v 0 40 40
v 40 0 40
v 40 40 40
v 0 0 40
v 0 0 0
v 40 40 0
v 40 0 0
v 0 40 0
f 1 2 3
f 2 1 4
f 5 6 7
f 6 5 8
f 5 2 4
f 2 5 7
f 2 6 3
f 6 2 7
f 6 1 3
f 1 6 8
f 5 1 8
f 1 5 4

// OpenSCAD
// Simple parametric cube generator for OpenSCAD
// Tweak the parameters below. Supports optional chamfer or fillet.

/****************************
 * User parameters
 ****************************/
size_x = 40;
size_y = 40;
size_z = 40;
center_cube = false;     // center at origin if true

// Edge treatment: choose one of none | chamfer | fillet
edge_style = "none";     // "none", "chamfer", or "fillet"
edge_amount = 3;          // chamfer size or fillet radius
$fn = 48;

/****************************
 * Helpers
 ****************************/
module base_cube(sz=[40,40,40], center=false) {
    cube(sz, center=center);
}

module chamfered_cube(sz=[40,40,40], c=2, center=false) {
    // Chamfer edges by subtracting triangular prisms at each edge
    difference() {
        cube(sz, center=center);
        // Work in a non-centered frame for simplicity
        translate(center ? [-sz[0]/2, -sz[1]/2, -sz[2]/2] : [0,0,0]) {
            // X edges
            for (y=[0, sz[1]-c], z=[0, sz[2]-c])
                translate([0, y, z]) rotate([0,90,0]) prism(c, sz[0]);
            for (y=[0, sz[1]-c], z=[0, sz[2]-c])
                translate([sz[0], y, z]) rotate([0,90,180]) prism(c, sz[0]);
            // Y edges
            for (x=[0, sz[0]-c], z=[0, sz[2]-c])
                translate([x, 0, z]) rotate([90,0,0]) prism(c, sz[1]);
            for (x=[0, sz[0]-c], z=[0, sz[2]-c])
                translate([x, sz[1], z]) rotate([90,0,180]) prism(c, sz[1]);
            // Z edges
            for (x=[0, sz[0]-c], y=[0, sz[1]-c])
                translate([x, y, 0]) rotate([0,0,0]) prism(c, sz[2]);
            for (x=[0, sz[0]-c], y=[0, sz[1]-c])
                translate([x, y, sz[2]]) rotate([180,0,0]) prism(c, sz[2]);
        }
    }
}

module prism(a=2, h=10) {
    // Right triangular prism used for chamfers; right angle at origin on XY
    linear_extrude(height=h)
        polygon(points=[[0,0],[a,0],[0,a]]);
}

module filleted_cube(sz=[40,40,40], r=3, center=false) {
    // Fillet edges via minkowski with a sphere, then crop back to original size
    // Minkowski expands all sides by r; we subtract r later with translate and intersection
    minkowski() {
        cube([max(sz[0]-2*r,0.01), max(sz[1]-2*r,0.01), max(sz[2]-2*r,0.01)], center=center);
        sphere(r=r);
    }
}

/****************************
 * Assembly
 ****************************/
module cube_generator() {
    sz = [size_x, size_y, size_z];
    if (edge_style == "none")
        base_cube(sz, center_cube);
    else if (edge_style == "chamfer")
        chamfered_cube(sz, edge_amount, center_cube);
    else if (edge_style == "fillet")
        filleted_cube(sz, edge_amount, center_cube);
    else
        base_cube(sz, center_cube);
}

// Render
cube_generator();
